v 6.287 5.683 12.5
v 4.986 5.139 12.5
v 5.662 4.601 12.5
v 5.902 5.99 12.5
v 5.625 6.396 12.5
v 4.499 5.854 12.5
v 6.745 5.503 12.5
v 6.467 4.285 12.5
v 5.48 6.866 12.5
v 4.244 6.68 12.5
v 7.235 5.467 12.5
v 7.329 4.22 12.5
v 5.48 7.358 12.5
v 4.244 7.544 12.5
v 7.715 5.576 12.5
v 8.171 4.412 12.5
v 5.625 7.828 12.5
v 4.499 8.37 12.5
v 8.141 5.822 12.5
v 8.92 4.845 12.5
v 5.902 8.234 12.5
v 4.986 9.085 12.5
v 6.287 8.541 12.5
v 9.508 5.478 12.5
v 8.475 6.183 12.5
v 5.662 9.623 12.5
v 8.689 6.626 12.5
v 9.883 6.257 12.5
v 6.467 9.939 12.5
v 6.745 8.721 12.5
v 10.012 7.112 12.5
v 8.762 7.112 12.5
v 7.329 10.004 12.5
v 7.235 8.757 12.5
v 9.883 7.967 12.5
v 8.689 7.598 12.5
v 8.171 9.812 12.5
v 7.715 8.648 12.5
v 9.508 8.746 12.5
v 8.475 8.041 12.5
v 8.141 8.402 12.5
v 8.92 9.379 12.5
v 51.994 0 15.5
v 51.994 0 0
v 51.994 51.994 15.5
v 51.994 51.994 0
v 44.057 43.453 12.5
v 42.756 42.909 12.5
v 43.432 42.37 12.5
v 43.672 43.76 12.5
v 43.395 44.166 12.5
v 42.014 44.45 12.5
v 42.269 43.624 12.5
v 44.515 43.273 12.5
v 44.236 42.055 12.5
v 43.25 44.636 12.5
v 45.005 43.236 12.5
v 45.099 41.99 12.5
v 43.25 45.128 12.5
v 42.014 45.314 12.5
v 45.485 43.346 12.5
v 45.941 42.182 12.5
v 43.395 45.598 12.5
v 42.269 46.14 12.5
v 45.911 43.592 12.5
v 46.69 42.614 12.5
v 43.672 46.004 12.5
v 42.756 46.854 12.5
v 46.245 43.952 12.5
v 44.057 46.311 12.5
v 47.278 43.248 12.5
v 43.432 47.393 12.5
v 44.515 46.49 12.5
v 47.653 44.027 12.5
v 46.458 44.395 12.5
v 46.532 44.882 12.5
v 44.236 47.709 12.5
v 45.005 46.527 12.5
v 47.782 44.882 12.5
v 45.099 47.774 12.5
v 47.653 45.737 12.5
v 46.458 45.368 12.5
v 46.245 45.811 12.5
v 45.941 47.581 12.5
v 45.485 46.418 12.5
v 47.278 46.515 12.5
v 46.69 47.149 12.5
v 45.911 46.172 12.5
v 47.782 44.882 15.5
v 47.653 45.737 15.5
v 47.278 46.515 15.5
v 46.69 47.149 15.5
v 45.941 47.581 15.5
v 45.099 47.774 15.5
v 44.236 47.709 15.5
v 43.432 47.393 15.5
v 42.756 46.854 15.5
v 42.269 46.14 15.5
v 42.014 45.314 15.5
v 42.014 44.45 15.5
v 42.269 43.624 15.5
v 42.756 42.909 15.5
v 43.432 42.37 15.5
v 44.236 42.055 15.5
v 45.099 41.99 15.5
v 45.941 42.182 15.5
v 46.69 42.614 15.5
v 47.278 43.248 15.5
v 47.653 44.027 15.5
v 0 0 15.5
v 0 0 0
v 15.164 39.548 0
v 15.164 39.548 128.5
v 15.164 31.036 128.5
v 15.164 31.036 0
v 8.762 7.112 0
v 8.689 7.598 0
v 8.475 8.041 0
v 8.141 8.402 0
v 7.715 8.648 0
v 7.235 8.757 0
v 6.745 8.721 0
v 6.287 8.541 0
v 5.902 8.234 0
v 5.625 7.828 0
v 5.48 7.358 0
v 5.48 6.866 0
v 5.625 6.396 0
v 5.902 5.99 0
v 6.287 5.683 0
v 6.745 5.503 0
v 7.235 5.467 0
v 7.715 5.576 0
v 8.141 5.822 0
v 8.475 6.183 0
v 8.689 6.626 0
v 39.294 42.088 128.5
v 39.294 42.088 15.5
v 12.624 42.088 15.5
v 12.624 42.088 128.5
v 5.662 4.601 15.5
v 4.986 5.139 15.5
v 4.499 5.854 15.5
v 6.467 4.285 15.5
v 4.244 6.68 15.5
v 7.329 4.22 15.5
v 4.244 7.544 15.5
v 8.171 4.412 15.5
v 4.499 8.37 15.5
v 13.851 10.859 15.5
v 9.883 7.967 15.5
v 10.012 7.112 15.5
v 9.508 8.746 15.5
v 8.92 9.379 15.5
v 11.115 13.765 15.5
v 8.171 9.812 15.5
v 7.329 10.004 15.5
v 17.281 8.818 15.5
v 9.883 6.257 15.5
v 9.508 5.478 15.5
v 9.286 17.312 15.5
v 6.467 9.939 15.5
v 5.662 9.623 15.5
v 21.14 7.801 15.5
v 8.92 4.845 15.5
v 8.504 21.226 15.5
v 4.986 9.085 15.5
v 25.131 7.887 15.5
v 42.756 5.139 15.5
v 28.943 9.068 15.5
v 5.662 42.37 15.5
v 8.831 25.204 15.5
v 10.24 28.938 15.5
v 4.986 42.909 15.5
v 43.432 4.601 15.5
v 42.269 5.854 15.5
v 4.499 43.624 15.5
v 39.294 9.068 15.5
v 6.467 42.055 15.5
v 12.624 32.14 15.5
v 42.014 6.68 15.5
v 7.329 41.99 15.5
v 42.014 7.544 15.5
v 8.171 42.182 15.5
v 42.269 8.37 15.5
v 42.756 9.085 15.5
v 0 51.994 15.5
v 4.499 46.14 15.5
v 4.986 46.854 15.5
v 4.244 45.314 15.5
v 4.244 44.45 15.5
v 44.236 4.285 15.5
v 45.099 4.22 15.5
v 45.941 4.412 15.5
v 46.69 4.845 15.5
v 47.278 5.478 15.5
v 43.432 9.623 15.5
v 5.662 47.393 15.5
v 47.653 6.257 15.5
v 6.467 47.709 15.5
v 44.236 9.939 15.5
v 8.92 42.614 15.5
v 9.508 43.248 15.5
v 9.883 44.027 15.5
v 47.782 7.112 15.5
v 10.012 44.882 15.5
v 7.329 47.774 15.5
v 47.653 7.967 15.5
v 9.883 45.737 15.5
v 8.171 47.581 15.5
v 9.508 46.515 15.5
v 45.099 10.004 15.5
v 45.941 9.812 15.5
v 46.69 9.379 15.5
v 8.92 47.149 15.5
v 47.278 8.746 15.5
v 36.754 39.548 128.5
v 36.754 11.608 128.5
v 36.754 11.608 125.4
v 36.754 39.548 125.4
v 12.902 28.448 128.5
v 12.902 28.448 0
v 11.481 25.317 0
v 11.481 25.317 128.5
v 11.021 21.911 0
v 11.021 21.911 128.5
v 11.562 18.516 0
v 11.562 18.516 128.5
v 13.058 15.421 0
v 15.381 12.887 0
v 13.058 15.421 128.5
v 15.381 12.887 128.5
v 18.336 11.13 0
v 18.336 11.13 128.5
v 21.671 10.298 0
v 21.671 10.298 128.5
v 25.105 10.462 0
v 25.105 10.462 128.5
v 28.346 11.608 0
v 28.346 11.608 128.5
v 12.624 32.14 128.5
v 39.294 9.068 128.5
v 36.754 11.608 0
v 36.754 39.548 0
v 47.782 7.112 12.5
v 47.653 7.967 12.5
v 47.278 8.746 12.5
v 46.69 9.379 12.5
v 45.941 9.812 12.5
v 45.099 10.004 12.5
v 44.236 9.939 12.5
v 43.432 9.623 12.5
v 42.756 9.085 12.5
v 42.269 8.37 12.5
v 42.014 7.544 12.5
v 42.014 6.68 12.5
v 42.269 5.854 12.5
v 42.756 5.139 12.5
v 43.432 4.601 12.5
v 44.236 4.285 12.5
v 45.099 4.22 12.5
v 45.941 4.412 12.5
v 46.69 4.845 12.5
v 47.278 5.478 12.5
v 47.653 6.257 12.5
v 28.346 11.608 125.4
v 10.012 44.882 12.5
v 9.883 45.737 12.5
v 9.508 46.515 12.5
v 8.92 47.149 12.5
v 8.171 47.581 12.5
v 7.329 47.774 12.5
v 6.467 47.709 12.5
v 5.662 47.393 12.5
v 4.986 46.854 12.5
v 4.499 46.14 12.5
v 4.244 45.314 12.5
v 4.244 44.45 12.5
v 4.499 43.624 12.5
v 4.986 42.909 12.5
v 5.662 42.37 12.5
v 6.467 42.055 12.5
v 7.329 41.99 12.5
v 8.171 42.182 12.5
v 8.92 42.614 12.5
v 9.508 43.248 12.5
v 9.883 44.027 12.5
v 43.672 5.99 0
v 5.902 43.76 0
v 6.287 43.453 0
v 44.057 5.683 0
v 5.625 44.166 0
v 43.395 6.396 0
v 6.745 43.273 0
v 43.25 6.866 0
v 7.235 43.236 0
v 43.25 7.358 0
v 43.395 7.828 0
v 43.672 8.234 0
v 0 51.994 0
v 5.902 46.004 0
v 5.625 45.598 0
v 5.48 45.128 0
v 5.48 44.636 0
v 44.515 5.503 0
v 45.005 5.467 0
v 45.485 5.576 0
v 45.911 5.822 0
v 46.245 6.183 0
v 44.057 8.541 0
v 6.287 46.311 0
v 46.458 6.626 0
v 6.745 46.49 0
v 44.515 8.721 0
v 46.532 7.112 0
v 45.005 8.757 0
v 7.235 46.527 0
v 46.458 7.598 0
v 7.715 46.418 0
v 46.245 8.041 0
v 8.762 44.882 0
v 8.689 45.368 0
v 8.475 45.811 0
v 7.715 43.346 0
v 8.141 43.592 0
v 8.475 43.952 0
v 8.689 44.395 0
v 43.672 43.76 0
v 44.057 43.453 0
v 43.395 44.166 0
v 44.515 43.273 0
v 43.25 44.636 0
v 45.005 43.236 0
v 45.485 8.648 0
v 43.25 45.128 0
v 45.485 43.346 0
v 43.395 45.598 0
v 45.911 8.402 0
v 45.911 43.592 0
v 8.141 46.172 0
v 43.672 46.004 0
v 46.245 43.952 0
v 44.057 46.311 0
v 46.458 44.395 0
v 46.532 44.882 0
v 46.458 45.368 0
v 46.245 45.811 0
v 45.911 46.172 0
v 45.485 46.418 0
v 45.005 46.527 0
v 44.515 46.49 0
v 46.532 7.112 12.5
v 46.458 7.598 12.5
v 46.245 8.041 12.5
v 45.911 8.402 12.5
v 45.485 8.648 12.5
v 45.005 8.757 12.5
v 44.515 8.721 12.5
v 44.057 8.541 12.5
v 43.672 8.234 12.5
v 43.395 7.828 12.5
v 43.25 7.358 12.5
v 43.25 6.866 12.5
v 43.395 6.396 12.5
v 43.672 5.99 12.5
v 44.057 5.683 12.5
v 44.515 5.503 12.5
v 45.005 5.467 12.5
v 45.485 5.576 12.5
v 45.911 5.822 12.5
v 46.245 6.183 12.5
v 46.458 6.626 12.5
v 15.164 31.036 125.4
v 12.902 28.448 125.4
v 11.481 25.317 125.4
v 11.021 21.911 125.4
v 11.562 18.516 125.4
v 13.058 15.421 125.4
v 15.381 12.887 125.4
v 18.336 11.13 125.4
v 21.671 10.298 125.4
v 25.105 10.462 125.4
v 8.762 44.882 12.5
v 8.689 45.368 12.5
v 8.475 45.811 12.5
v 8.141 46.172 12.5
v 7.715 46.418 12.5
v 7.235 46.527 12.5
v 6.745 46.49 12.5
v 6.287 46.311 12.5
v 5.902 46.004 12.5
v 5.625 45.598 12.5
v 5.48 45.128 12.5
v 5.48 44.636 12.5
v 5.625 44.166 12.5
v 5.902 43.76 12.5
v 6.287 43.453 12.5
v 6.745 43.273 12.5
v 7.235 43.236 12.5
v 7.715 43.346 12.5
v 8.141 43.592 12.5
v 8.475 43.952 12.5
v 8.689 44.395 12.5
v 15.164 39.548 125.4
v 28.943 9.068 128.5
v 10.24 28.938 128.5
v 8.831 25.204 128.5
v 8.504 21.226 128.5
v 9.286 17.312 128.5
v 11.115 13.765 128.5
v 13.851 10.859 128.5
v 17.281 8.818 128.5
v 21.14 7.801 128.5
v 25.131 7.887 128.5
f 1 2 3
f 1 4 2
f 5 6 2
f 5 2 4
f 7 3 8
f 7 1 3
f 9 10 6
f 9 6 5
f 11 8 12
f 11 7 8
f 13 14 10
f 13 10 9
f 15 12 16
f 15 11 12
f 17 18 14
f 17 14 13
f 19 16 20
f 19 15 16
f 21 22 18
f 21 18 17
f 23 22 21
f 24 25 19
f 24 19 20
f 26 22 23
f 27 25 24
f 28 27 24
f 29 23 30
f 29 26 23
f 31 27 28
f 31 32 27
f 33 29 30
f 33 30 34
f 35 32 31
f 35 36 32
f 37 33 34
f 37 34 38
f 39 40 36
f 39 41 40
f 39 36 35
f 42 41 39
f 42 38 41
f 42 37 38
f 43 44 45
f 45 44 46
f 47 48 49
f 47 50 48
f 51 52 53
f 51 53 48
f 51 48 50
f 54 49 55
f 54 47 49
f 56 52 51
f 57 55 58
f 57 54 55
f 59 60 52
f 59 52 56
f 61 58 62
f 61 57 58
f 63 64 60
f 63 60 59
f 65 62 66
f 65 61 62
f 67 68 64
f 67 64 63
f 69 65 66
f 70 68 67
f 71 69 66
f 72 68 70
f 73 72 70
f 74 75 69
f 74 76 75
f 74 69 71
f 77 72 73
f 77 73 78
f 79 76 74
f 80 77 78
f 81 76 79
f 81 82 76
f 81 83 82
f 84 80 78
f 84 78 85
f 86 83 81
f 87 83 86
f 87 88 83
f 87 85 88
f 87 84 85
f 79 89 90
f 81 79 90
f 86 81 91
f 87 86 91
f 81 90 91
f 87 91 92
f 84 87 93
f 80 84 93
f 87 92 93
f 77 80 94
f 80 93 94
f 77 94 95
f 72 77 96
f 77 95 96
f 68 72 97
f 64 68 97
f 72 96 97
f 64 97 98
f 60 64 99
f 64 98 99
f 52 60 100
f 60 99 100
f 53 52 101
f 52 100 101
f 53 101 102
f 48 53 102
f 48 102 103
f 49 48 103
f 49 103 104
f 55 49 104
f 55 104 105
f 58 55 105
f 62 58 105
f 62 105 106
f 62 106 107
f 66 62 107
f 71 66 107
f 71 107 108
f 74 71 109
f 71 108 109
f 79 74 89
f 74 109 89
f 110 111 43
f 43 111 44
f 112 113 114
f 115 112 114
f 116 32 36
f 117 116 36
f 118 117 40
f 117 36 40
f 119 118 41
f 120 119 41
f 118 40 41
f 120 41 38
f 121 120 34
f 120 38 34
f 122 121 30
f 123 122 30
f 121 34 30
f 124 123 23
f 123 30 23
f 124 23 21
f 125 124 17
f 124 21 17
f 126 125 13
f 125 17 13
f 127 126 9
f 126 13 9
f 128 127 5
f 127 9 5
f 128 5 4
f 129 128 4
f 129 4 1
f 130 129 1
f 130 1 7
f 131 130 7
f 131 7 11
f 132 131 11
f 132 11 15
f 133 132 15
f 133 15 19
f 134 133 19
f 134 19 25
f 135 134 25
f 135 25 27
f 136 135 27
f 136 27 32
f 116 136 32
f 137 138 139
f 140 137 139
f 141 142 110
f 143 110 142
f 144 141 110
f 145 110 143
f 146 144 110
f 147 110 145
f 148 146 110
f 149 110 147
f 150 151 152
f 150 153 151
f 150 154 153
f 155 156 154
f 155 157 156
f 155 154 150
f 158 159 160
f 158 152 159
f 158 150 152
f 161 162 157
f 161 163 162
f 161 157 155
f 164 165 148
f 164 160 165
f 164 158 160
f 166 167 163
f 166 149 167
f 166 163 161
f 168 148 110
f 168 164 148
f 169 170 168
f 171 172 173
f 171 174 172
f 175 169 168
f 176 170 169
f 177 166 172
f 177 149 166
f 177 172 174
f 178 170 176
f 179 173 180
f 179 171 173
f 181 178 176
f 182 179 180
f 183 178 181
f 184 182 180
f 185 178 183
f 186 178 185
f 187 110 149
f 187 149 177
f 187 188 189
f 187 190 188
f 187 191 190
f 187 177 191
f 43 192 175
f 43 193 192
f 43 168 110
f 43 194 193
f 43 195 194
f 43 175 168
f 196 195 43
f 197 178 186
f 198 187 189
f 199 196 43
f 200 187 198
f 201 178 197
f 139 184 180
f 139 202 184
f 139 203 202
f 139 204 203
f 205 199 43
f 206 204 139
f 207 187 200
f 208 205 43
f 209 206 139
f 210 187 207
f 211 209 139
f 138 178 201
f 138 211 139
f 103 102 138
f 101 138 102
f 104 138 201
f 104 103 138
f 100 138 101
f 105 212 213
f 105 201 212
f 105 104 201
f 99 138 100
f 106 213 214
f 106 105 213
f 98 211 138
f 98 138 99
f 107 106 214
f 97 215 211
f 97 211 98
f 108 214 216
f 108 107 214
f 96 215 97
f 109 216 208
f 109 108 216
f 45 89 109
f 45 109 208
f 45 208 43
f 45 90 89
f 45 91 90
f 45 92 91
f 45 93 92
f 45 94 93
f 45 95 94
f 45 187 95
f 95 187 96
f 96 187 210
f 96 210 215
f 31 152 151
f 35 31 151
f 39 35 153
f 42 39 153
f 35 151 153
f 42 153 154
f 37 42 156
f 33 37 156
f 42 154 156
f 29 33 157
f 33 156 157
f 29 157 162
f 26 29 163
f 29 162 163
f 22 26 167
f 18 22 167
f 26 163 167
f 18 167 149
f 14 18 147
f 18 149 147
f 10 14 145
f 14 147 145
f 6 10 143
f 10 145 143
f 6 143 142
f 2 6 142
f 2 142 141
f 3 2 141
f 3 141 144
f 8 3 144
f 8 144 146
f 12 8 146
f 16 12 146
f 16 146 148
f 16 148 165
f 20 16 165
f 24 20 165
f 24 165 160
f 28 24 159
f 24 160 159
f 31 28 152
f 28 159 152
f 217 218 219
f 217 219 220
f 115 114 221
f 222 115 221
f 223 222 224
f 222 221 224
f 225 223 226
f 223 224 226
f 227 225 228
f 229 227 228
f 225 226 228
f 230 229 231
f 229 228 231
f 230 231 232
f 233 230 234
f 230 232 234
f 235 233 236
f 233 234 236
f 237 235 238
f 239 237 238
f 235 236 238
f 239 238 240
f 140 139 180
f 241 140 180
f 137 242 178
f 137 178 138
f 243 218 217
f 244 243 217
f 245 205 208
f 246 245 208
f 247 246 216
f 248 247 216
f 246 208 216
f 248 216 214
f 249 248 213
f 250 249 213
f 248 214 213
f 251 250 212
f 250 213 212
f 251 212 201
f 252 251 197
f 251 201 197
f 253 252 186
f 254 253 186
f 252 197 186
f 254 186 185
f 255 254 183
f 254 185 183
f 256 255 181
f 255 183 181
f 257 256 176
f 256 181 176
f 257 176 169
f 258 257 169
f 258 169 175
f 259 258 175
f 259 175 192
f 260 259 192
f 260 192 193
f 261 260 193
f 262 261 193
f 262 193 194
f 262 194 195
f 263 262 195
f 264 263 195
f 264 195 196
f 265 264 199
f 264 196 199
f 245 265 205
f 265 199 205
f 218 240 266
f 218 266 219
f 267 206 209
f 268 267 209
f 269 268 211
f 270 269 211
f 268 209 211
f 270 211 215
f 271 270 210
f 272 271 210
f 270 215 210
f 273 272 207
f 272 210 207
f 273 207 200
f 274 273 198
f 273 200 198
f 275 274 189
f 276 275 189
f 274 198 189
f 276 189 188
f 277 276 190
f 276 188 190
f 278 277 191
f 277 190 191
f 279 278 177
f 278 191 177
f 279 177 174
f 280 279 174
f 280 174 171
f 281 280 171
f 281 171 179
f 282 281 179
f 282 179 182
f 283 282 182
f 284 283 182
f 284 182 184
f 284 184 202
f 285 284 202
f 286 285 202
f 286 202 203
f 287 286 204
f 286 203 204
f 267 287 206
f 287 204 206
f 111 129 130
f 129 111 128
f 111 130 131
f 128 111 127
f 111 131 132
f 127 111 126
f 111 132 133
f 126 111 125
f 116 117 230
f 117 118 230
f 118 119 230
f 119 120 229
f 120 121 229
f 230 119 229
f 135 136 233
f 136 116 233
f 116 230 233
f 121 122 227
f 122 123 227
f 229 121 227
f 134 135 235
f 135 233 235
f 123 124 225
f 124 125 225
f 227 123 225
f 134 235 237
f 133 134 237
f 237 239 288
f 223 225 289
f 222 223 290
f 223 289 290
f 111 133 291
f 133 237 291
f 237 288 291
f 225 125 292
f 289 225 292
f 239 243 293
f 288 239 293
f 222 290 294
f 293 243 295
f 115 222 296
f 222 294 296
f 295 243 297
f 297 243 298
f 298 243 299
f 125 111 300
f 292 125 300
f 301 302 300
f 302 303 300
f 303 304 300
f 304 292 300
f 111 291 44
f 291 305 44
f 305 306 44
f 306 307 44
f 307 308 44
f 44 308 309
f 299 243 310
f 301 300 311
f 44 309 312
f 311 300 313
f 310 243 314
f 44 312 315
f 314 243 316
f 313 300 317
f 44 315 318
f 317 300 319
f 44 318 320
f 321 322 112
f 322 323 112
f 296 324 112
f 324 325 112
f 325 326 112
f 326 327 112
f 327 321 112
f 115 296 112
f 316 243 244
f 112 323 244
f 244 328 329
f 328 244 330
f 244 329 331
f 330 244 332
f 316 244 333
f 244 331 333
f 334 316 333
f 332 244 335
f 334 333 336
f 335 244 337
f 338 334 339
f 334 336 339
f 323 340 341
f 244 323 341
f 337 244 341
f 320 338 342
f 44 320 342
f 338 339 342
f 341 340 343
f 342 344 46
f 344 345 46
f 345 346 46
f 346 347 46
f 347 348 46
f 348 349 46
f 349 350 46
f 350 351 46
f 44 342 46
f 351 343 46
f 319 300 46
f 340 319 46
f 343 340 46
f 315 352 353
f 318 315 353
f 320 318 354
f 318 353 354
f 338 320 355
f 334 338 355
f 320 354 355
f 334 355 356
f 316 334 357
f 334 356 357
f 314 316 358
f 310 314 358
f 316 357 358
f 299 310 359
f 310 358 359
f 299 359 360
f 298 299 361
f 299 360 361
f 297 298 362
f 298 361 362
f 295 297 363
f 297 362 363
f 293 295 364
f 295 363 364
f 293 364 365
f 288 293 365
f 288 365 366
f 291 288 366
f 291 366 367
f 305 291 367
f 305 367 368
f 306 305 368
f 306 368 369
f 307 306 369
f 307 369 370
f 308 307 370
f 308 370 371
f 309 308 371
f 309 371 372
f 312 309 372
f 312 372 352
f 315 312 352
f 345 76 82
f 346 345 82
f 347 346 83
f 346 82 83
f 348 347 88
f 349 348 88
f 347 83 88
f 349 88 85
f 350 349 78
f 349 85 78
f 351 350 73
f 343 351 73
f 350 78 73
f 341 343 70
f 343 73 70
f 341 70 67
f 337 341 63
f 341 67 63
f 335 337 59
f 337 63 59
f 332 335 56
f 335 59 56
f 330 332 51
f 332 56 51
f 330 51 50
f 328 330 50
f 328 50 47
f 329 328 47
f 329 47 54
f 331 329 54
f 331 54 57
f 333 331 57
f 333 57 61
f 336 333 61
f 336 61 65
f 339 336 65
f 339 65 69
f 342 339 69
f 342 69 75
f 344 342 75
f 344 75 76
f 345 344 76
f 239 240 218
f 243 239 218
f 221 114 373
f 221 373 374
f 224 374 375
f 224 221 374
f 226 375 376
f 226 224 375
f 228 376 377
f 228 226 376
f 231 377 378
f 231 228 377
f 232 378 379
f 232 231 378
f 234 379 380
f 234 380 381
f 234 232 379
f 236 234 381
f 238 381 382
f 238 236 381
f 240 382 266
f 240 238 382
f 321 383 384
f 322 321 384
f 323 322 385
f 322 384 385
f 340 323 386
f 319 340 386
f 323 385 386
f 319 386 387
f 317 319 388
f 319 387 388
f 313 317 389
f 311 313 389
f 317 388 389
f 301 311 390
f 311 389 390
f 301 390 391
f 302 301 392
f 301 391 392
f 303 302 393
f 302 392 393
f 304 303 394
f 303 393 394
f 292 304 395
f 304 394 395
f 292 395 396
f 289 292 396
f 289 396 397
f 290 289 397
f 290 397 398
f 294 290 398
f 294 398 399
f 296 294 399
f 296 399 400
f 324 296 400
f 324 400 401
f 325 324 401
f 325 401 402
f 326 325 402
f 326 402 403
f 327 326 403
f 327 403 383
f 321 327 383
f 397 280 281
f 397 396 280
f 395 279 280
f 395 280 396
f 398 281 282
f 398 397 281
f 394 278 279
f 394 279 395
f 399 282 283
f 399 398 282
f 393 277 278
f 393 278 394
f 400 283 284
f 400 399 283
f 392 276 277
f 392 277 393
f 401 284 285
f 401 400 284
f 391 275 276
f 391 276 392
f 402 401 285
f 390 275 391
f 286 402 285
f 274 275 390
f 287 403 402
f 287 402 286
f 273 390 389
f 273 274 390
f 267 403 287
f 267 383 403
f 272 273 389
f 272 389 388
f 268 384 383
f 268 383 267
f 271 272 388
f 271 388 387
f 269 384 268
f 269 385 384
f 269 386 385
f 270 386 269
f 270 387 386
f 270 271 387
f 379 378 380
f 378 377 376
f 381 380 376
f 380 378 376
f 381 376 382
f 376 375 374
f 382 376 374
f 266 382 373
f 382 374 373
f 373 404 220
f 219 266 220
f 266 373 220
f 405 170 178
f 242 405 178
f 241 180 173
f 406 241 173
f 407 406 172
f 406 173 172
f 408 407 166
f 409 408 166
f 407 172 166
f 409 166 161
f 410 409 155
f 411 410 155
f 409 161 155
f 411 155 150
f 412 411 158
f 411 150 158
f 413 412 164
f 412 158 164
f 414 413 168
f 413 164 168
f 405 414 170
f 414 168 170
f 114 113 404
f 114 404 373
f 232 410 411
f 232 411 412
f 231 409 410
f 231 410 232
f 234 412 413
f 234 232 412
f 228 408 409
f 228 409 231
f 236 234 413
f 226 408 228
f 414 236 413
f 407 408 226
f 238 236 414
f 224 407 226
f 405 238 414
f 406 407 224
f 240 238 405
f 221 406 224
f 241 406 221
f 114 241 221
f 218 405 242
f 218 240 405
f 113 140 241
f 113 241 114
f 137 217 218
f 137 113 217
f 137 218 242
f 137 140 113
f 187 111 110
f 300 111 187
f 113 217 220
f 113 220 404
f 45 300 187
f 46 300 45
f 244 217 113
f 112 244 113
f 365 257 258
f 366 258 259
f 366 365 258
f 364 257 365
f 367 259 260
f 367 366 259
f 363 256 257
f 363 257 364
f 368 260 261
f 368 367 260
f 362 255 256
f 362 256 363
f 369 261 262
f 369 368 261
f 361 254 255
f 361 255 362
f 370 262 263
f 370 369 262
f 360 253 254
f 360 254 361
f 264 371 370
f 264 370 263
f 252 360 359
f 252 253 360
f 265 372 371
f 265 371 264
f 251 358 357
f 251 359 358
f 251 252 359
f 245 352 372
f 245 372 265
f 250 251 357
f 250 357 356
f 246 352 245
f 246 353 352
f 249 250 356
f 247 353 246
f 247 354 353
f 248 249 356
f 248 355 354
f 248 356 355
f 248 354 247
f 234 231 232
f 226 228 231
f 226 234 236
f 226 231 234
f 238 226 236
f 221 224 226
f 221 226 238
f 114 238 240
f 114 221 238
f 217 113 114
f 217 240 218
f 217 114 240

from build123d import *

# Parameters (mm, degrees)
F0_W      = 51.9938
F0_H      = 51.9938
F1_DEPTH  = 15.5
F2_R      = 2.9
F3_DEPTH  = 3
F4_R      = 1.65
F5_DEPTH  = 12.501
F6_R      = 1.65
F7_DEPTH  = 12.501
F8_R      = 1.65
F9_DEPTH  = 12.501
F10_R     = 1.65
F11_DEPTH = 12.501
F13_DEPTH = 113
F15_DEPTH = 128.501
F17_DEPTH = 3.1


with BuildPart() as f1:
    # F0 (on Top) → F1 (new body)
    with BuildSketch(Plane.XY):
        with Locations((25.9969, 25.9969)):
            Rectangle(F0_W, F0_H)
    extrude(amount=F1_DEPTH)

    # F2 (on face) → F3 (cut)
    with BuildSketch(Plane.XY.offset(15.5)):
        with Locations((7.112, 44.8818)):
            Circle(F2_R)
        with Locations((44.8818, 44.8818)):
            Circle(F2_R)
        with Locations((7.112, 7.112)):
            Circle(F2_R)
        with Locations((44.8818, 7.112)):
            Circle(F2_R)
    extrude(amount=-F3_DEPTH, mode=Mode.SUBTRACT)

    # F4 (on face) → F5 (cut, through all)
    with BuildSketch(Plane.XY.offset(12.5)):
        with Locations((7.112, 44.8818)):
            Circle(F4_R)
    extrude(amount=-F5_DEPTH, mode=Mode.SUBTRACT)

    # F6 (on face) → F7 (cut, through all)
    with BuildSketch(Plane.XY.offset(12.5)):
        with Locations((44.8818, 44.8818)):
            Circle(F6_R)
    extrude(amount=-F7_DEPTH, mode=Mode.SUBTRACT)

    # F8 (on face) → F9 (cut, through all)
    with BuildSketch(Plane.XY.offset(12.5)):
        with Locations((7.112, 7.112)):
            Circle(F8_R)
    extrude(amount=-F9_DEPTH, mode=Mode.SUBTRACT)

    # F10 (on face) → F11 (cut, through all)
    with BuildSketch(Plane.XY.offset(12.5)):
        with Locations((44.8818, 7.112)):
            Circle(F10_R)
    extrude(amount=-F11_DEPTH, mode=Mode.SUBTRACT)

    # F12 (on face) → F13 (join)
    with BuildSketch(Plane.XY.offset(15.5)):
        with BuildLine():
            Line((39.2938, 9.0678), (39.2938, 42.0878))
            Line((39.2938, 42.0878), (12.6238, 42.0878))
            Line((12.6238, 42.0878), (12.6238, 32.139773))
            ThreePointArc((12.6238, 32.139773), (11.114919, 13.764895), (28.943272, 9.0678))
            Line((28.943272, 9.0678), (39.2938, 9.0678))
        make_face()
    extrude(amount=F13_DEPTH)

    # F14 (on face) → F15 (cut, through all)
    with BuildSketch(Plane.XY.offset(128.5)):
        with BuildLine():
            Line((36.7538, 11.6078), (36.7538, 39.5478))
            Line((36.7538, 39.5478), (15.1638, 39.5478))
            Line((15.1638, 39.5478), (15.1638, 31.036067))
            ThreePointArc((15.1638, 31.036067), (13.057664, 15.420665), (28.346177, 11.6078))
            Line((28.346177, 11.6078), (36.7538, 11.6078))
        make_face()
    extrude(amount=-F15_DEPTH, mode=Mode.SUBTRACT)


with BuildPart() as f17:
    # F16 (on face) → F17 (new body)
    with BuildSketch(Plane.XY.offset(128.5)):
        with BuildLine():
            Line((36.7538, 39.5478), (15.1638, 39.5478))
            Line((15.1638, 39.5478), (15.1638, 31.036067))
            ThreePointArc((15.1638, 31.036067), (13.057664, 15.420665), (28.346177, 11.6078))
            Line((28.346177, 11.6078), (36.7538, 11.6078))
            Line((36.7538, 11.6078), (36.7538, 39.5478))
        make_face()
    extrude(amount=-F17_DEPTH)


solid = Compound([f1.part, f17.part])
